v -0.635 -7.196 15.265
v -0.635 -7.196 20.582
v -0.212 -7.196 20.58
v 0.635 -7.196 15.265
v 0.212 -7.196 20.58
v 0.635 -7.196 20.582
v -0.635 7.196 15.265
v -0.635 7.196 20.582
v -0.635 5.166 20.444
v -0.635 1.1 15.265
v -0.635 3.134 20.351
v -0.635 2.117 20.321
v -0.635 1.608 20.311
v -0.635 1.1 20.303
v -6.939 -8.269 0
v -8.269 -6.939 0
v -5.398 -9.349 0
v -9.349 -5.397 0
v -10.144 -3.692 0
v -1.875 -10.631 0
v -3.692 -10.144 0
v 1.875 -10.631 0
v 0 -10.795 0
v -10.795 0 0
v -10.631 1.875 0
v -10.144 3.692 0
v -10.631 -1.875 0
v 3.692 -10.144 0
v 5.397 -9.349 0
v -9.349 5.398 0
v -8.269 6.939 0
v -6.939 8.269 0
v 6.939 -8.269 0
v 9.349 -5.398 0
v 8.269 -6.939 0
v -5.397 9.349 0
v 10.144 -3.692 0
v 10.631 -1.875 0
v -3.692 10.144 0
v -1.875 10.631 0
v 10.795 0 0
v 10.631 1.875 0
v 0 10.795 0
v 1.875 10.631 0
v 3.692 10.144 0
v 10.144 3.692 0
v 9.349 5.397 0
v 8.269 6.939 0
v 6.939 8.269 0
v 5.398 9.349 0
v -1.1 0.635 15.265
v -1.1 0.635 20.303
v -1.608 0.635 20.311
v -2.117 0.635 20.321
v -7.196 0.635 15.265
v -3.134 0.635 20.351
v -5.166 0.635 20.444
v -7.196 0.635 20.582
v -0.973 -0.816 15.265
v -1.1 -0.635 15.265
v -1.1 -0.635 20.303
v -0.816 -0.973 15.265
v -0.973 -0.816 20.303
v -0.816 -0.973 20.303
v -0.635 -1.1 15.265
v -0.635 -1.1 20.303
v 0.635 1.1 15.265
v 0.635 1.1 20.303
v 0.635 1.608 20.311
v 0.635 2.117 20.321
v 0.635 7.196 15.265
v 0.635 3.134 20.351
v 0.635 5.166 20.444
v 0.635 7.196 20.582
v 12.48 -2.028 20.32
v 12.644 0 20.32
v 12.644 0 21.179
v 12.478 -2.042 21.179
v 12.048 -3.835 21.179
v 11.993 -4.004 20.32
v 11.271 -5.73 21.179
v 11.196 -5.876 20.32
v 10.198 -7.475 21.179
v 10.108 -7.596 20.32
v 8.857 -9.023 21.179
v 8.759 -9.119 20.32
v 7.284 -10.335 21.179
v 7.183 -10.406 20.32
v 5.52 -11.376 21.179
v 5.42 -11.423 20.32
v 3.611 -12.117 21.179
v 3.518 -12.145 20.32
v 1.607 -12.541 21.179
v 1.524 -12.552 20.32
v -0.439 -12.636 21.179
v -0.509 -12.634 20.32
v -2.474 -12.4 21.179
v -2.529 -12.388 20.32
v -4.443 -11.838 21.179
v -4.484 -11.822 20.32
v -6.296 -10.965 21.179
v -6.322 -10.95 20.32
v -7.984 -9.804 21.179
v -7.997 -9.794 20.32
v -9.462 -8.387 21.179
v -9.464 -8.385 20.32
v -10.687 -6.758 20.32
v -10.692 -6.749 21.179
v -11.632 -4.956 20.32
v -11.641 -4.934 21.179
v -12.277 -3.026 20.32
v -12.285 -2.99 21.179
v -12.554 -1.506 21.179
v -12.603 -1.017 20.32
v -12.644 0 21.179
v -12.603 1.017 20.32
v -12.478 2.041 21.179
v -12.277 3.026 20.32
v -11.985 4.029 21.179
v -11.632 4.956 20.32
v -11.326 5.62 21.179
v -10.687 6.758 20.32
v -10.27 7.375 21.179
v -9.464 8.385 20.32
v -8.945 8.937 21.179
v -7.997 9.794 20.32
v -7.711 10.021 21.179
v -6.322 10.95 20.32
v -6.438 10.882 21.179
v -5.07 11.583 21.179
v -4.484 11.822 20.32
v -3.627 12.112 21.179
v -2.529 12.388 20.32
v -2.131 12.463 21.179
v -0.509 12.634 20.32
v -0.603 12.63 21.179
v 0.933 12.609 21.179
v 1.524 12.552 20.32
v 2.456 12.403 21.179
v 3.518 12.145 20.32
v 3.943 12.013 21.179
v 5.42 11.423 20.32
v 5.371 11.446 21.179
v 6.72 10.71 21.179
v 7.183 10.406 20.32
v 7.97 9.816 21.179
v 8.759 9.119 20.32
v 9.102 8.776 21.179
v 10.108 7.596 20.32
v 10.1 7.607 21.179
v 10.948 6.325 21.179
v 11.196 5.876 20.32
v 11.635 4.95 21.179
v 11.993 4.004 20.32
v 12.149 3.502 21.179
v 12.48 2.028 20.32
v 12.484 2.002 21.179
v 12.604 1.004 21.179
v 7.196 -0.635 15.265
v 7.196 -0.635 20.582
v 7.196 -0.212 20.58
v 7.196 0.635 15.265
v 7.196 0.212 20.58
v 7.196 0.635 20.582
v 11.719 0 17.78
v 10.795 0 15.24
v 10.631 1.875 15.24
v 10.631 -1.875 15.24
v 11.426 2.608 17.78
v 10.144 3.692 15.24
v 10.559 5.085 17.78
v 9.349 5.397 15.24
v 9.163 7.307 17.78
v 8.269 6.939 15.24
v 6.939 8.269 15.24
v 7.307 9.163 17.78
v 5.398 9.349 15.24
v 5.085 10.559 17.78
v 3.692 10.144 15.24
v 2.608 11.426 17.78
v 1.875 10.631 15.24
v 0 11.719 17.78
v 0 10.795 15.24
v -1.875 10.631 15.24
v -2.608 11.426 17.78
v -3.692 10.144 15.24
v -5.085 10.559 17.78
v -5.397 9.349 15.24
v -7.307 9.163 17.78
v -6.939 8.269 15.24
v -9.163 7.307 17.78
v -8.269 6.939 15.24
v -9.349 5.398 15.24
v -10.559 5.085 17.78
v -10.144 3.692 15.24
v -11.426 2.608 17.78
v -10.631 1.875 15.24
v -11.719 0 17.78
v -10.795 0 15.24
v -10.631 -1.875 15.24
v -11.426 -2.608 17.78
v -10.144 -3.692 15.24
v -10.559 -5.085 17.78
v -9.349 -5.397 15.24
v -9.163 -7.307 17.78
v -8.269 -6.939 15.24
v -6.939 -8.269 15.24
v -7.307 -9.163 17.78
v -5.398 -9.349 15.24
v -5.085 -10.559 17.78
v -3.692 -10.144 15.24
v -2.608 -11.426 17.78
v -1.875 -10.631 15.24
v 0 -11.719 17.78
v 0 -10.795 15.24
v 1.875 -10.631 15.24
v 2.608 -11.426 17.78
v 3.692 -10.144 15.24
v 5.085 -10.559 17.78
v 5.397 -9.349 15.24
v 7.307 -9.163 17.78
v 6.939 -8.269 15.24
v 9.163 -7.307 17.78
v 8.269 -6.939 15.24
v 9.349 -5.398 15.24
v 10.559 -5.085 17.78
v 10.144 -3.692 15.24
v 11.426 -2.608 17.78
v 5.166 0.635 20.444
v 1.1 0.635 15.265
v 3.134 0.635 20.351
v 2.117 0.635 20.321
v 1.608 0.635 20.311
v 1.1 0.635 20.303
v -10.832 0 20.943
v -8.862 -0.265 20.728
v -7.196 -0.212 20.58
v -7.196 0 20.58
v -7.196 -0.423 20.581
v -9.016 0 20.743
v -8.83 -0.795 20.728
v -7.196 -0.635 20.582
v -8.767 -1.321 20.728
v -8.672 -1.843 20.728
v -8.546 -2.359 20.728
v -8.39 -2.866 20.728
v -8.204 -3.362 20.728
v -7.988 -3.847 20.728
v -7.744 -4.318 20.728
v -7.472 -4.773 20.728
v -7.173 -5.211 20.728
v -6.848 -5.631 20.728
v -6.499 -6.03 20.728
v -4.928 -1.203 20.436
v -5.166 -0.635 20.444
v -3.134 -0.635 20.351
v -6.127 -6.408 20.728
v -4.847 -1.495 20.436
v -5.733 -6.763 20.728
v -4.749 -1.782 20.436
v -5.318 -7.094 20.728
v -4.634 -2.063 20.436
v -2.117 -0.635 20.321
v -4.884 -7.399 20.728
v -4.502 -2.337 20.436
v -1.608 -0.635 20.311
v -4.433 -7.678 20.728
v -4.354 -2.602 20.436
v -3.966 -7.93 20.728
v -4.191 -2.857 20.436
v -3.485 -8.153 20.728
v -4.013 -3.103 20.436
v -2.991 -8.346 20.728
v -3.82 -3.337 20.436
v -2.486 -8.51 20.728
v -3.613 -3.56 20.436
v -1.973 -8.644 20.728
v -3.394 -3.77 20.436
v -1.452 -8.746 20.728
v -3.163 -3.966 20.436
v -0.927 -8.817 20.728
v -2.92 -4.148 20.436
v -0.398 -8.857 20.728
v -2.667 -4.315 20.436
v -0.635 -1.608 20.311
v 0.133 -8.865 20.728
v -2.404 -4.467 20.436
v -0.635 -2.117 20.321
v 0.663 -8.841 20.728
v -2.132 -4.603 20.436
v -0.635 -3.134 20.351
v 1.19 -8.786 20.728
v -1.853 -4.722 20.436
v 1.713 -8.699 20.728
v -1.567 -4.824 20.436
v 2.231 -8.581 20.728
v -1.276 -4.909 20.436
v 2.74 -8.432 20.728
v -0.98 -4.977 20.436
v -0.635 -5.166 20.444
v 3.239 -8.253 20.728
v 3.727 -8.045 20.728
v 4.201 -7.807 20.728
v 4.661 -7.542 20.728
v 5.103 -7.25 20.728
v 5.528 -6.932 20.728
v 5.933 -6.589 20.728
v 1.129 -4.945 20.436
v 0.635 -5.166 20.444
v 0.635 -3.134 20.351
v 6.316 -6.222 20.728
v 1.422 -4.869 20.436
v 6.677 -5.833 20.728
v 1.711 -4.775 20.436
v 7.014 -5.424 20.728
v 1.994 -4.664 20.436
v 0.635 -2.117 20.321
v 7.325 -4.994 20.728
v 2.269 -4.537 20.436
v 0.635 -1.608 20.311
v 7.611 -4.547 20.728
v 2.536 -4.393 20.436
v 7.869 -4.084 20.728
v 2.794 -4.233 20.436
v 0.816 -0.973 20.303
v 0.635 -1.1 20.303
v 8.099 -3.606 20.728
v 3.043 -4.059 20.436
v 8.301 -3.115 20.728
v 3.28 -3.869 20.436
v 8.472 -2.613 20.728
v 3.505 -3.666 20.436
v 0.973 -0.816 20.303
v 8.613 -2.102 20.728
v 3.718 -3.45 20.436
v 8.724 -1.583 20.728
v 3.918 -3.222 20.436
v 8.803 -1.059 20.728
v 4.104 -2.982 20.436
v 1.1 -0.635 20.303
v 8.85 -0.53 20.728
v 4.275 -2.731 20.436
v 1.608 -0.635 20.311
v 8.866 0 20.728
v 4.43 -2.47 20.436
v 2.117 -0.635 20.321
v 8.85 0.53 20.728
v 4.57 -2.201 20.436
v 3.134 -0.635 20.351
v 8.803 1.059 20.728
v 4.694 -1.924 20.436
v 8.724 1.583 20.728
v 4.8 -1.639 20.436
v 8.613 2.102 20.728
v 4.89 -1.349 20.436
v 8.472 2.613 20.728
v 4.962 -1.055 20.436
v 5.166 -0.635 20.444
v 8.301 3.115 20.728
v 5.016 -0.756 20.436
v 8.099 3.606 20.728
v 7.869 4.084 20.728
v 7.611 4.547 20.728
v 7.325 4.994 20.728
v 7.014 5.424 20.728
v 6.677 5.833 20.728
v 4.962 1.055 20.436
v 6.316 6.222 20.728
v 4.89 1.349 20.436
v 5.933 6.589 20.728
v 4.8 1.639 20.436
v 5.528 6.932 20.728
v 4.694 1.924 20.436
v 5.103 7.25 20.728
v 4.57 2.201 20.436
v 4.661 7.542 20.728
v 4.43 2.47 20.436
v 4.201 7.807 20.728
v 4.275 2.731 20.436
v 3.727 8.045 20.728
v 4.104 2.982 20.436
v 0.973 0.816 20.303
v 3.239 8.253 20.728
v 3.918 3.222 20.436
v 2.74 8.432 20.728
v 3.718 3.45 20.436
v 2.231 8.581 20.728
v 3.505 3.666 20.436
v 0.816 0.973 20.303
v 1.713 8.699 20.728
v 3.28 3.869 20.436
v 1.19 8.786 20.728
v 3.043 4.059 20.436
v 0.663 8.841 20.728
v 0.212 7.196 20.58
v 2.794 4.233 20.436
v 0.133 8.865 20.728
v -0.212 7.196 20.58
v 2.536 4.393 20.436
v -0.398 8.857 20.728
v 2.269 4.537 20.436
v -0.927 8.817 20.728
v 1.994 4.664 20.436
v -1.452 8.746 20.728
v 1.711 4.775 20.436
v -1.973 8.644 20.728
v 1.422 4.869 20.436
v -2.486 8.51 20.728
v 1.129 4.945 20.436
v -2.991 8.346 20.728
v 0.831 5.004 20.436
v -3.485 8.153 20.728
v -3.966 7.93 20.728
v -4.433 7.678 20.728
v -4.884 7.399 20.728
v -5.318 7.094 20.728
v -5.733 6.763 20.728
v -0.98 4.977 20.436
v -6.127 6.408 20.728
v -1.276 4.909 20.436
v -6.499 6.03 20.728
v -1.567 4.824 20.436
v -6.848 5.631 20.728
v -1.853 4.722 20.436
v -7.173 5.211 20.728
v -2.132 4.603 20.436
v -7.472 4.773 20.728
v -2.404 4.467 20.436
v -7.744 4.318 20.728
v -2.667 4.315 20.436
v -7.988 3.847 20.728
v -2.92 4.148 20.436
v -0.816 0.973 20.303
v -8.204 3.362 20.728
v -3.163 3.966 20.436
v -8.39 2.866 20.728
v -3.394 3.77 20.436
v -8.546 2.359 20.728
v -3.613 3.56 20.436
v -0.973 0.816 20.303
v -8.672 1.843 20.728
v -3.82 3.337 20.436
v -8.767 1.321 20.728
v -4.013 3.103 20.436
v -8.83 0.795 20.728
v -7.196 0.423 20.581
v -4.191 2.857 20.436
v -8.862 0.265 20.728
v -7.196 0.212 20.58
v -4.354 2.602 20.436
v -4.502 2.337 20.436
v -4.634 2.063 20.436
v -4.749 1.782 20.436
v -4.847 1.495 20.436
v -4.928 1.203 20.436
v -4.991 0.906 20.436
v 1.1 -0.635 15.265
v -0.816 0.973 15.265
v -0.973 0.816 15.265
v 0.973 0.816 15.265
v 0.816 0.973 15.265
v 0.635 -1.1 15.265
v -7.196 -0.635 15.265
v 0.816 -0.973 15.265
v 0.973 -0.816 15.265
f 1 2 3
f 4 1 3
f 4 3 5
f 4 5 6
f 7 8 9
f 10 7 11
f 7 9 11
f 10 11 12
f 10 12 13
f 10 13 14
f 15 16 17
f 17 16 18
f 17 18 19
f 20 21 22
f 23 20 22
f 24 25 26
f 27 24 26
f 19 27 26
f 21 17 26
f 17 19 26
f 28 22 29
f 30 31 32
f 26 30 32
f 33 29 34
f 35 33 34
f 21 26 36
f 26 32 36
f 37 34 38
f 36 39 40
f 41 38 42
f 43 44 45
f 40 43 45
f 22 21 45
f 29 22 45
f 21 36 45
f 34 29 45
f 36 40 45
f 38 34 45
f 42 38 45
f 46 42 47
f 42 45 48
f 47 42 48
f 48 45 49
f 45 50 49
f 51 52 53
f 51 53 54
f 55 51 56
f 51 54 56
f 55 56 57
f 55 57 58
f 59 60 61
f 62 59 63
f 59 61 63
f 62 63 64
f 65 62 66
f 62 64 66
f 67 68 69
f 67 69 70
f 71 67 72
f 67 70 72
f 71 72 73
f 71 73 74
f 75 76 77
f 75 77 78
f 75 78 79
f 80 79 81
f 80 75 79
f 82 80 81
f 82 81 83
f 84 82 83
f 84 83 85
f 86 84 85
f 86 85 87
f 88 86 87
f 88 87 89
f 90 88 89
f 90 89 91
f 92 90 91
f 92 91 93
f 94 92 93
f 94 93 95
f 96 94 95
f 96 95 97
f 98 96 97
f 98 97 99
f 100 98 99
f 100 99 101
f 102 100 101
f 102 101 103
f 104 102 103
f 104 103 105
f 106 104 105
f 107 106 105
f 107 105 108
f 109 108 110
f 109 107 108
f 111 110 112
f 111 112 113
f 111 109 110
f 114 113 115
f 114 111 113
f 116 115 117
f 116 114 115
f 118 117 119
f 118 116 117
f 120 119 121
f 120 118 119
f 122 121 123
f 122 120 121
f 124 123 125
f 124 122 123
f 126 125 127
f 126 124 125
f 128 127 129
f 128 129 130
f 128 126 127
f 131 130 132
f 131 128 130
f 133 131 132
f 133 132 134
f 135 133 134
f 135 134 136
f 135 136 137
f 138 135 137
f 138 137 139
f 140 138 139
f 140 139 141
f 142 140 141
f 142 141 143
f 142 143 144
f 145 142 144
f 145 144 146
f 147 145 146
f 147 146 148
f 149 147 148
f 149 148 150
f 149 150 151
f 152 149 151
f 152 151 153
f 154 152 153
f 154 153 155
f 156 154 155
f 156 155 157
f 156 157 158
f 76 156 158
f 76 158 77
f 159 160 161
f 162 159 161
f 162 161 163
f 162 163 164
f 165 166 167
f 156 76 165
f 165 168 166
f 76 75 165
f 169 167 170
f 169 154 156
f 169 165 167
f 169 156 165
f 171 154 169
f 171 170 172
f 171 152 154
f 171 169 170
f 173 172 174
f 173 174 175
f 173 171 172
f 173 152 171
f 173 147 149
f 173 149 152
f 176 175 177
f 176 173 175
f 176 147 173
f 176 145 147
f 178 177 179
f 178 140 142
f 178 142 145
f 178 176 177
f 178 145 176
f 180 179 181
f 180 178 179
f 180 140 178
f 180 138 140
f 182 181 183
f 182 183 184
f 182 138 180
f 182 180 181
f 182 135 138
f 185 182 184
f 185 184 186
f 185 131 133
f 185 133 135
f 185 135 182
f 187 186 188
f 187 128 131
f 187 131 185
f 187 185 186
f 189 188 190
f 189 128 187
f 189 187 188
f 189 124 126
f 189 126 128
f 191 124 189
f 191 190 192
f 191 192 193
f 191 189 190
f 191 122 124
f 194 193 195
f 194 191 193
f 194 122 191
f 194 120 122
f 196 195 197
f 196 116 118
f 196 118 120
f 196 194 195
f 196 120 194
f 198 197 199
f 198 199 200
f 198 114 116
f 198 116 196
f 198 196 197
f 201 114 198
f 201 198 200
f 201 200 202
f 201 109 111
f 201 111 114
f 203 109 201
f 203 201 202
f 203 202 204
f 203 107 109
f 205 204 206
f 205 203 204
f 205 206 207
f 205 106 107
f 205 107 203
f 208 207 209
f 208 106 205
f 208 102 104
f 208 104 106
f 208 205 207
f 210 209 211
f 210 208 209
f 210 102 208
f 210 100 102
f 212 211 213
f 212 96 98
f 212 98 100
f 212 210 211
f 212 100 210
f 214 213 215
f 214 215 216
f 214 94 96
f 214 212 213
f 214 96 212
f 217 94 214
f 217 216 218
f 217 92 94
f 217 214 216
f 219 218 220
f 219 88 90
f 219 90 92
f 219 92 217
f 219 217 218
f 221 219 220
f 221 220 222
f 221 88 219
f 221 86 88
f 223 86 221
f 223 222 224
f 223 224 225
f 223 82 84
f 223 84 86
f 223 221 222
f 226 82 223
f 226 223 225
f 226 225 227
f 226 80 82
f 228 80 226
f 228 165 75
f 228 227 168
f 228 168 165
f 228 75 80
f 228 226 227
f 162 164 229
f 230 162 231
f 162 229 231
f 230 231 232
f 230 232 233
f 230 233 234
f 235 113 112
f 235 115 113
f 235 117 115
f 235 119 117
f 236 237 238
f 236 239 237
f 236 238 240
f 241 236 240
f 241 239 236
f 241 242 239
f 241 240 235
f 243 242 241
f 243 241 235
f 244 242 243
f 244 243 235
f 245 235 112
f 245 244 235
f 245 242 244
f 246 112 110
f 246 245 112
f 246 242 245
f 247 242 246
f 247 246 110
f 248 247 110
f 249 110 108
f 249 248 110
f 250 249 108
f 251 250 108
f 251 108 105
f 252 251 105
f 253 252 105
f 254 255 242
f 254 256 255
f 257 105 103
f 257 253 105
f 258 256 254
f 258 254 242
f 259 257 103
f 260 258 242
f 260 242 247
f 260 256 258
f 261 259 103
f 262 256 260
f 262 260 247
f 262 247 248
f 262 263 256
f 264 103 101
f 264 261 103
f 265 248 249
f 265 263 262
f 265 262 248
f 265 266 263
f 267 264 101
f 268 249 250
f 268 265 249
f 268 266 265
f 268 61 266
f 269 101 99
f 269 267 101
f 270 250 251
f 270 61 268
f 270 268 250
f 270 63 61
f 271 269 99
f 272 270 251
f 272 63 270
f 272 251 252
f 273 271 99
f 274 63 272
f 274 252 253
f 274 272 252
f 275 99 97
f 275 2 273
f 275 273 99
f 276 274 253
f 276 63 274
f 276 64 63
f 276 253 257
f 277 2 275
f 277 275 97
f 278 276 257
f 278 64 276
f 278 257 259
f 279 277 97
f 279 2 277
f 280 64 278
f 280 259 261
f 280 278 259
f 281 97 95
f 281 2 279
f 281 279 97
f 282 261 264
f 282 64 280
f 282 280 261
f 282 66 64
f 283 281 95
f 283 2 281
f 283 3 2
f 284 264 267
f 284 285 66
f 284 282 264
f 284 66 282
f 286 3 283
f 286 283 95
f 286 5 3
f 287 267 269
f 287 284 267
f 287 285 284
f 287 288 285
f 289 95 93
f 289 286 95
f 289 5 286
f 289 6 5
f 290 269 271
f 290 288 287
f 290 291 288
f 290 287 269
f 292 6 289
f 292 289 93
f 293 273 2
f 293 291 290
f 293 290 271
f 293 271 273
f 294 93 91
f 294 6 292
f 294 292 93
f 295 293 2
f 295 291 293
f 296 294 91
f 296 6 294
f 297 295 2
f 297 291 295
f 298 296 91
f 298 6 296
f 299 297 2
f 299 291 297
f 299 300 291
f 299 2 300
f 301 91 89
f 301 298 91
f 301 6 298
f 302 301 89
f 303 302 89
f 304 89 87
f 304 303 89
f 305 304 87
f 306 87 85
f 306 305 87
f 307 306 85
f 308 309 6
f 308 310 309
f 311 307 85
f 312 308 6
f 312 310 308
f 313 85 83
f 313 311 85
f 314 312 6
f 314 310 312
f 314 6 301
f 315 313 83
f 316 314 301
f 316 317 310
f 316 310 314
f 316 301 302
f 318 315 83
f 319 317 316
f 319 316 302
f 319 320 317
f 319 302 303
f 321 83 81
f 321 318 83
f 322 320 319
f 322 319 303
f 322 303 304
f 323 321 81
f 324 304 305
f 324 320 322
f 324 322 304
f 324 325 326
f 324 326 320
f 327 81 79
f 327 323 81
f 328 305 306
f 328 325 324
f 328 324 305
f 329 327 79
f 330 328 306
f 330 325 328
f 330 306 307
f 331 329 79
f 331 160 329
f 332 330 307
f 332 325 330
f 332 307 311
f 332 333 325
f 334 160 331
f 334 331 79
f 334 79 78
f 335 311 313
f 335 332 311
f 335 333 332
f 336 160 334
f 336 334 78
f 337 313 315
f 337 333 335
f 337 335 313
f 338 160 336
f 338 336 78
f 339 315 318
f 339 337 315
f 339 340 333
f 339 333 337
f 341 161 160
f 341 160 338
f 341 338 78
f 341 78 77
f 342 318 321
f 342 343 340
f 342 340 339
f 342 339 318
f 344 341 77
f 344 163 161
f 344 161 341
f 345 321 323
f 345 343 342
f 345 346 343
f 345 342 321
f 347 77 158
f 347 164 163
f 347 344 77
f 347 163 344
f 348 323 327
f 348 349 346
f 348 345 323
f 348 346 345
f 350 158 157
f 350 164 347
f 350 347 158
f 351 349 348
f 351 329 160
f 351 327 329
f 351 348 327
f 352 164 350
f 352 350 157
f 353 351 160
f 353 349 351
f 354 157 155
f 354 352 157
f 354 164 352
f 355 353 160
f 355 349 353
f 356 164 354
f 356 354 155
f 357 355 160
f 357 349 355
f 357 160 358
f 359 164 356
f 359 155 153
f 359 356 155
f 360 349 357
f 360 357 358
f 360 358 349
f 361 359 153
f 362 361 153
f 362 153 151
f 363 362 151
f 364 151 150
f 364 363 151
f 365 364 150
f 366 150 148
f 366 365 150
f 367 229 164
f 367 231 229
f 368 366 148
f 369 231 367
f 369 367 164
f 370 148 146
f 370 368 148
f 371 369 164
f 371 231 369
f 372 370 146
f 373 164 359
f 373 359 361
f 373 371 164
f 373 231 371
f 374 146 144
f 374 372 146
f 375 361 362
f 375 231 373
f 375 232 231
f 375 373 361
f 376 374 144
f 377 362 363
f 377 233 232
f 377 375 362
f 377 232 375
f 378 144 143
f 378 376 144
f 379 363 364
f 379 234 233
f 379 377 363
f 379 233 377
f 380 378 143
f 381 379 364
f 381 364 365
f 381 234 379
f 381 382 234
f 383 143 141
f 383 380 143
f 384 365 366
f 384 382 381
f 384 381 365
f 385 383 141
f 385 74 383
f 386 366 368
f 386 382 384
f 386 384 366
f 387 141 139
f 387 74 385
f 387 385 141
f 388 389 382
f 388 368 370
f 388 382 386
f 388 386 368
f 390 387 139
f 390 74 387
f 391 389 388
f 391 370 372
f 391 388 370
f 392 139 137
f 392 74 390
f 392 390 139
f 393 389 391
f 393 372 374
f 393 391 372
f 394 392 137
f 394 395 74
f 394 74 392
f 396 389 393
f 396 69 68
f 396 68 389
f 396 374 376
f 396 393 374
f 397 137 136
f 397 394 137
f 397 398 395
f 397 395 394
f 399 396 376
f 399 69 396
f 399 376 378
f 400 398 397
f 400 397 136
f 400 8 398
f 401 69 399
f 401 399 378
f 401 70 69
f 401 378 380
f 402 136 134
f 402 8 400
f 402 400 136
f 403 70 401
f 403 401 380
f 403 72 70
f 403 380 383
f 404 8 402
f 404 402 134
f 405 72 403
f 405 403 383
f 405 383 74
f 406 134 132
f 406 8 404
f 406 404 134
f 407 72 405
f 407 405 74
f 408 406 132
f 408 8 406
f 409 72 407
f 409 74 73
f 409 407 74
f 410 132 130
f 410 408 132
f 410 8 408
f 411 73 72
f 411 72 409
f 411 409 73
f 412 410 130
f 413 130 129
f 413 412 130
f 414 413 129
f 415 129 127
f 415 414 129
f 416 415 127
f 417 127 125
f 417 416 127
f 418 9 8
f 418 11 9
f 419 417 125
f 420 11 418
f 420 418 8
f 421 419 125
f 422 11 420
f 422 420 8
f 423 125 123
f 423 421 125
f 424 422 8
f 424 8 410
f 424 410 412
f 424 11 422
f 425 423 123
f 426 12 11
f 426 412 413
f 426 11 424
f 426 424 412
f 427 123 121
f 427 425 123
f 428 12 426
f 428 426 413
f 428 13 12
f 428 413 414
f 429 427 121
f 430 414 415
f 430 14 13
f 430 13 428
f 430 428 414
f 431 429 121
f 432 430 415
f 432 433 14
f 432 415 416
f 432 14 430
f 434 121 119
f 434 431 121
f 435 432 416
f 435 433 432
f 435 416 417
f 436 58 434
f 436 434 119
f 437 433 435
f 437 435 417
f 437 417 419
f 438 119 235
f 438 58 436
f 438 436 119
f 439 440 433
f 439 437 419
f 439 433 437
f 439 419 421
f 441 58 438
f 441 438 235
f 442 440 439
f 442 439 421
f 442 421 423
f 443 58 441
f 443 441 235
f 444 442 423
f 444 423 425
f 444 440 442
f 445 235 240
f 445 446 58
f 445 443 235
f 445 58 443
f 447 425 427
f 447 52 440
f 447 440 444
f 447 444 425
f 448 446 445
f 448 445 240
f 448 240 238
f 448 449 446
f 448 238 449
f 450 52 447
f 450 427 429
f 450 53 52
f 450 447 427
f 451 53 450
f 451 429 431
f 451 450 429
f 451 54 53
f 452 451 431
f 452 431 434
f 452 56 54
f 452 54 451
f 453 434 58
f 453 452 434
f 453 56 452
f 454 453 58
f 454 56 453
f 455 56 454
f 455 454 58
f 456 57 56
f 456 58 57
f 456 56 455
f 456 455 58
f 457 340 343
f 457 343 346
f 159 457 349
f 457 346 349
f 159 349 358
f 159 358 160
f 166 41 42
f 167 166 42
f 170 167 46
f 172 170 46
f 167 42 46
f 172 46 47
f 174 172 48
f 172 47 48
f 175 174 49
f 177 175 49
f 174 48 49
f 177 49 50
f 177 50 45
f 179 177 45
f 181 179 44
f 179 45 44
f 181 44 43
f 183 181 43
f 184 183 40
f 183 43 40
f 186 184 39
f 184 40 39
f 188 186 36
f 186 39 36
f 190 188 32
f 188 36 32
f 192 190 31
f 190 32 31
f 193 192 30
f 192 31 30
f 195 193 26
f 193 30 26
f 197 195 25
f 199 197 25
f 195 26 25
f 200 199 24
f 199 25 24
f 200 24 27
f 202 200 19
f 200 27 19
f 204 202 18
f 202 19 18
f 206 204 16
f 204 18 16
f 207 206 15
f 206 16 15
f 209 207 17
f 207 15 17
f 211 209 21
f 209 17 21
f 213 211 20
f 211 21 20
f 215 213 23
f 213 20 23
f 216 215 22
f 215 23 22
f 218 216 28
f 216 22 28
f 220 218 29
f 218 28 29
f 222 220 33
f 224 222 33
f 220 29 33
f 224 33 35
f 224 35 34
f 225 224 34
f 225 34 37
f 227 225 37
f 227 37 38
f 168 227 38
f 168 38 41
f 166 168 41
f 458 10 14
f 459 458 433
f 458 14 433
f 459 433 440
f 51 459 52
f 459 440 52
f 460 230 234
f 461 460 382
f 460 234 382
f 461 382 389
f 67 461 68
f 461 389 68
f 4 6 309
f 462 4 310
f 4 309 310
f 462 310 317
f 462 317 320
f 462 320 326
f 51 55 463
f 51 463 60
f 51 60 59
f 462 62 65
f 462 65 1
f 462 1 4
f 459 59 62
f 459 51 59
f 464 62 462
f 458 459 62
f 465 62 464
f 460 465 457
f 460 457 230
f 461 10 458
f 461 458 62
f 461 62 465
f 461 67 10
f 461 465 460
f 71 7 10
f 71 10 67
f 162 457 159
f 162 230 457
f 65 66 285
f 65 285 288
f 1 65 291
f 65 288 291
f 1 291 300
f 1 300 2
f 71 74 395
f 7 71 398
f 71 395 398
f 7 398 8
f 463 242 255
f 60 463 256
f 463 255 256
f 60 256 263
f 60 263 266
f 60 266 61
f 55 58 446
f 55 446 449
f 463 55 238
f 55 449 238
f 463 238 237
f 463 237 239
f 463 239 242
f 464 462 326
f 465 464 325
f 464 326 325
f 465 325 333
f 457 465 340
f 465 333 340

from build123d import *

# Parameters (mm, degrees)
F0_R      = 10.795
F1_DEPTH  = 15.24
F1_FACE_R = 10.795
F2_DEPTH  = 5.08
F2_TAPER  = -20
F3_DEPTH  = 1.016
F5_DEPTH  = 6.0706


with BuildPart() as f1:
    # F0 (on Top) → F1 (new body)
    with BuildSketch(Plane.XY):
        Circle(F0_R)
    extrude(amount=F1_DEPTH)

    # F1_face (on face) → F2 (join)
    with BuildSketch(Plane.XY.offset(15.24)):
        Circle(F1_FACE_R)
    extrude(amount=F2_DEPTH, taper=F2_TAPER)

    # F3 (add): a face of the model
    f3_faces = [f1.faces().sort_by_distance(p)[0] for p in [
        (0, 0, 20.32),
    ]]
    extrude(f3_faces, amount=F3_DEPTH)

    # F4 (on face) → F5 (cut)
    with BuildSketch(Plane.XY.offset(21.336)):
        with BuildLine():
            Line((0.635, 7.1958522628), (-0.635, 7.1958522628))
            Line((-0.635, 7.1958522628), (-0.635, 1.0998522628))
            ThreePointArc((-0.635, 1.0998522628), (-0.8980256121, 0.8980256121), (-1.0998522628, 0.635))
            Line((-1.0998522628, 0.635), (-7.1958522628, 0.635))
            Line((-7.1958522628, 0.635), (-7.1958522628, -0.635))
            Line((-7.1958522628, -0.635), (-1.0998522628, -0.635))
            ThreePointArc((-1.0998522628, -0.635), (-0.8980256121, -0.8980256121), (-0.635, -1.0998522628))
            Line((-0.635, -1.0998522628), (-0.635, -7.1958522628))
            Line((-0.635, -7.1958522628), (0.635, -7.1958522628))
            Line((0.635, -7.1958522628), (0.635, -1.0998522628))
            ThreePointArc((0.635, -1.0998522628), (0.8980256121, -0.8980256121), (1.0998522628, -0.635))
            Line((1.0998522628, -0.635), (7.1958522628, -0.635))
            Line((7.1958522628, -0.635), (7.1958522628, 0.635))
            Line((7.1958522628, 0.635), (1.0998522628, 0.635))
            ThreePointArc((1.0998522628, 0.635), (0.8980256121, 0.8980256121), (0.635, 1.0998522628))
            Line((0.635, 1.0998522628), (0.635, 7.1958522628))
        make_face()
    extrude(amount=-F5_DEPTH, mode=Mode.SUBTRACT)

    # F6 (on Front) → F7 (revolve, cut)
    with BuildSketch(Plane.XZ):
        with BuildLine():
            ThreePointArc((0, 201.9231468439), (-90.8144451678, 111.1087016761), (0, 20.2942565084))
            Line((0, 20.2942565084), (0, 201.9231468439))
        make_face()
    revolve(axis=Axis((0, 0, 111.1087016761), (0, 0, 1)), mode=Mode.SUBTRACT)


solid = f1.part
